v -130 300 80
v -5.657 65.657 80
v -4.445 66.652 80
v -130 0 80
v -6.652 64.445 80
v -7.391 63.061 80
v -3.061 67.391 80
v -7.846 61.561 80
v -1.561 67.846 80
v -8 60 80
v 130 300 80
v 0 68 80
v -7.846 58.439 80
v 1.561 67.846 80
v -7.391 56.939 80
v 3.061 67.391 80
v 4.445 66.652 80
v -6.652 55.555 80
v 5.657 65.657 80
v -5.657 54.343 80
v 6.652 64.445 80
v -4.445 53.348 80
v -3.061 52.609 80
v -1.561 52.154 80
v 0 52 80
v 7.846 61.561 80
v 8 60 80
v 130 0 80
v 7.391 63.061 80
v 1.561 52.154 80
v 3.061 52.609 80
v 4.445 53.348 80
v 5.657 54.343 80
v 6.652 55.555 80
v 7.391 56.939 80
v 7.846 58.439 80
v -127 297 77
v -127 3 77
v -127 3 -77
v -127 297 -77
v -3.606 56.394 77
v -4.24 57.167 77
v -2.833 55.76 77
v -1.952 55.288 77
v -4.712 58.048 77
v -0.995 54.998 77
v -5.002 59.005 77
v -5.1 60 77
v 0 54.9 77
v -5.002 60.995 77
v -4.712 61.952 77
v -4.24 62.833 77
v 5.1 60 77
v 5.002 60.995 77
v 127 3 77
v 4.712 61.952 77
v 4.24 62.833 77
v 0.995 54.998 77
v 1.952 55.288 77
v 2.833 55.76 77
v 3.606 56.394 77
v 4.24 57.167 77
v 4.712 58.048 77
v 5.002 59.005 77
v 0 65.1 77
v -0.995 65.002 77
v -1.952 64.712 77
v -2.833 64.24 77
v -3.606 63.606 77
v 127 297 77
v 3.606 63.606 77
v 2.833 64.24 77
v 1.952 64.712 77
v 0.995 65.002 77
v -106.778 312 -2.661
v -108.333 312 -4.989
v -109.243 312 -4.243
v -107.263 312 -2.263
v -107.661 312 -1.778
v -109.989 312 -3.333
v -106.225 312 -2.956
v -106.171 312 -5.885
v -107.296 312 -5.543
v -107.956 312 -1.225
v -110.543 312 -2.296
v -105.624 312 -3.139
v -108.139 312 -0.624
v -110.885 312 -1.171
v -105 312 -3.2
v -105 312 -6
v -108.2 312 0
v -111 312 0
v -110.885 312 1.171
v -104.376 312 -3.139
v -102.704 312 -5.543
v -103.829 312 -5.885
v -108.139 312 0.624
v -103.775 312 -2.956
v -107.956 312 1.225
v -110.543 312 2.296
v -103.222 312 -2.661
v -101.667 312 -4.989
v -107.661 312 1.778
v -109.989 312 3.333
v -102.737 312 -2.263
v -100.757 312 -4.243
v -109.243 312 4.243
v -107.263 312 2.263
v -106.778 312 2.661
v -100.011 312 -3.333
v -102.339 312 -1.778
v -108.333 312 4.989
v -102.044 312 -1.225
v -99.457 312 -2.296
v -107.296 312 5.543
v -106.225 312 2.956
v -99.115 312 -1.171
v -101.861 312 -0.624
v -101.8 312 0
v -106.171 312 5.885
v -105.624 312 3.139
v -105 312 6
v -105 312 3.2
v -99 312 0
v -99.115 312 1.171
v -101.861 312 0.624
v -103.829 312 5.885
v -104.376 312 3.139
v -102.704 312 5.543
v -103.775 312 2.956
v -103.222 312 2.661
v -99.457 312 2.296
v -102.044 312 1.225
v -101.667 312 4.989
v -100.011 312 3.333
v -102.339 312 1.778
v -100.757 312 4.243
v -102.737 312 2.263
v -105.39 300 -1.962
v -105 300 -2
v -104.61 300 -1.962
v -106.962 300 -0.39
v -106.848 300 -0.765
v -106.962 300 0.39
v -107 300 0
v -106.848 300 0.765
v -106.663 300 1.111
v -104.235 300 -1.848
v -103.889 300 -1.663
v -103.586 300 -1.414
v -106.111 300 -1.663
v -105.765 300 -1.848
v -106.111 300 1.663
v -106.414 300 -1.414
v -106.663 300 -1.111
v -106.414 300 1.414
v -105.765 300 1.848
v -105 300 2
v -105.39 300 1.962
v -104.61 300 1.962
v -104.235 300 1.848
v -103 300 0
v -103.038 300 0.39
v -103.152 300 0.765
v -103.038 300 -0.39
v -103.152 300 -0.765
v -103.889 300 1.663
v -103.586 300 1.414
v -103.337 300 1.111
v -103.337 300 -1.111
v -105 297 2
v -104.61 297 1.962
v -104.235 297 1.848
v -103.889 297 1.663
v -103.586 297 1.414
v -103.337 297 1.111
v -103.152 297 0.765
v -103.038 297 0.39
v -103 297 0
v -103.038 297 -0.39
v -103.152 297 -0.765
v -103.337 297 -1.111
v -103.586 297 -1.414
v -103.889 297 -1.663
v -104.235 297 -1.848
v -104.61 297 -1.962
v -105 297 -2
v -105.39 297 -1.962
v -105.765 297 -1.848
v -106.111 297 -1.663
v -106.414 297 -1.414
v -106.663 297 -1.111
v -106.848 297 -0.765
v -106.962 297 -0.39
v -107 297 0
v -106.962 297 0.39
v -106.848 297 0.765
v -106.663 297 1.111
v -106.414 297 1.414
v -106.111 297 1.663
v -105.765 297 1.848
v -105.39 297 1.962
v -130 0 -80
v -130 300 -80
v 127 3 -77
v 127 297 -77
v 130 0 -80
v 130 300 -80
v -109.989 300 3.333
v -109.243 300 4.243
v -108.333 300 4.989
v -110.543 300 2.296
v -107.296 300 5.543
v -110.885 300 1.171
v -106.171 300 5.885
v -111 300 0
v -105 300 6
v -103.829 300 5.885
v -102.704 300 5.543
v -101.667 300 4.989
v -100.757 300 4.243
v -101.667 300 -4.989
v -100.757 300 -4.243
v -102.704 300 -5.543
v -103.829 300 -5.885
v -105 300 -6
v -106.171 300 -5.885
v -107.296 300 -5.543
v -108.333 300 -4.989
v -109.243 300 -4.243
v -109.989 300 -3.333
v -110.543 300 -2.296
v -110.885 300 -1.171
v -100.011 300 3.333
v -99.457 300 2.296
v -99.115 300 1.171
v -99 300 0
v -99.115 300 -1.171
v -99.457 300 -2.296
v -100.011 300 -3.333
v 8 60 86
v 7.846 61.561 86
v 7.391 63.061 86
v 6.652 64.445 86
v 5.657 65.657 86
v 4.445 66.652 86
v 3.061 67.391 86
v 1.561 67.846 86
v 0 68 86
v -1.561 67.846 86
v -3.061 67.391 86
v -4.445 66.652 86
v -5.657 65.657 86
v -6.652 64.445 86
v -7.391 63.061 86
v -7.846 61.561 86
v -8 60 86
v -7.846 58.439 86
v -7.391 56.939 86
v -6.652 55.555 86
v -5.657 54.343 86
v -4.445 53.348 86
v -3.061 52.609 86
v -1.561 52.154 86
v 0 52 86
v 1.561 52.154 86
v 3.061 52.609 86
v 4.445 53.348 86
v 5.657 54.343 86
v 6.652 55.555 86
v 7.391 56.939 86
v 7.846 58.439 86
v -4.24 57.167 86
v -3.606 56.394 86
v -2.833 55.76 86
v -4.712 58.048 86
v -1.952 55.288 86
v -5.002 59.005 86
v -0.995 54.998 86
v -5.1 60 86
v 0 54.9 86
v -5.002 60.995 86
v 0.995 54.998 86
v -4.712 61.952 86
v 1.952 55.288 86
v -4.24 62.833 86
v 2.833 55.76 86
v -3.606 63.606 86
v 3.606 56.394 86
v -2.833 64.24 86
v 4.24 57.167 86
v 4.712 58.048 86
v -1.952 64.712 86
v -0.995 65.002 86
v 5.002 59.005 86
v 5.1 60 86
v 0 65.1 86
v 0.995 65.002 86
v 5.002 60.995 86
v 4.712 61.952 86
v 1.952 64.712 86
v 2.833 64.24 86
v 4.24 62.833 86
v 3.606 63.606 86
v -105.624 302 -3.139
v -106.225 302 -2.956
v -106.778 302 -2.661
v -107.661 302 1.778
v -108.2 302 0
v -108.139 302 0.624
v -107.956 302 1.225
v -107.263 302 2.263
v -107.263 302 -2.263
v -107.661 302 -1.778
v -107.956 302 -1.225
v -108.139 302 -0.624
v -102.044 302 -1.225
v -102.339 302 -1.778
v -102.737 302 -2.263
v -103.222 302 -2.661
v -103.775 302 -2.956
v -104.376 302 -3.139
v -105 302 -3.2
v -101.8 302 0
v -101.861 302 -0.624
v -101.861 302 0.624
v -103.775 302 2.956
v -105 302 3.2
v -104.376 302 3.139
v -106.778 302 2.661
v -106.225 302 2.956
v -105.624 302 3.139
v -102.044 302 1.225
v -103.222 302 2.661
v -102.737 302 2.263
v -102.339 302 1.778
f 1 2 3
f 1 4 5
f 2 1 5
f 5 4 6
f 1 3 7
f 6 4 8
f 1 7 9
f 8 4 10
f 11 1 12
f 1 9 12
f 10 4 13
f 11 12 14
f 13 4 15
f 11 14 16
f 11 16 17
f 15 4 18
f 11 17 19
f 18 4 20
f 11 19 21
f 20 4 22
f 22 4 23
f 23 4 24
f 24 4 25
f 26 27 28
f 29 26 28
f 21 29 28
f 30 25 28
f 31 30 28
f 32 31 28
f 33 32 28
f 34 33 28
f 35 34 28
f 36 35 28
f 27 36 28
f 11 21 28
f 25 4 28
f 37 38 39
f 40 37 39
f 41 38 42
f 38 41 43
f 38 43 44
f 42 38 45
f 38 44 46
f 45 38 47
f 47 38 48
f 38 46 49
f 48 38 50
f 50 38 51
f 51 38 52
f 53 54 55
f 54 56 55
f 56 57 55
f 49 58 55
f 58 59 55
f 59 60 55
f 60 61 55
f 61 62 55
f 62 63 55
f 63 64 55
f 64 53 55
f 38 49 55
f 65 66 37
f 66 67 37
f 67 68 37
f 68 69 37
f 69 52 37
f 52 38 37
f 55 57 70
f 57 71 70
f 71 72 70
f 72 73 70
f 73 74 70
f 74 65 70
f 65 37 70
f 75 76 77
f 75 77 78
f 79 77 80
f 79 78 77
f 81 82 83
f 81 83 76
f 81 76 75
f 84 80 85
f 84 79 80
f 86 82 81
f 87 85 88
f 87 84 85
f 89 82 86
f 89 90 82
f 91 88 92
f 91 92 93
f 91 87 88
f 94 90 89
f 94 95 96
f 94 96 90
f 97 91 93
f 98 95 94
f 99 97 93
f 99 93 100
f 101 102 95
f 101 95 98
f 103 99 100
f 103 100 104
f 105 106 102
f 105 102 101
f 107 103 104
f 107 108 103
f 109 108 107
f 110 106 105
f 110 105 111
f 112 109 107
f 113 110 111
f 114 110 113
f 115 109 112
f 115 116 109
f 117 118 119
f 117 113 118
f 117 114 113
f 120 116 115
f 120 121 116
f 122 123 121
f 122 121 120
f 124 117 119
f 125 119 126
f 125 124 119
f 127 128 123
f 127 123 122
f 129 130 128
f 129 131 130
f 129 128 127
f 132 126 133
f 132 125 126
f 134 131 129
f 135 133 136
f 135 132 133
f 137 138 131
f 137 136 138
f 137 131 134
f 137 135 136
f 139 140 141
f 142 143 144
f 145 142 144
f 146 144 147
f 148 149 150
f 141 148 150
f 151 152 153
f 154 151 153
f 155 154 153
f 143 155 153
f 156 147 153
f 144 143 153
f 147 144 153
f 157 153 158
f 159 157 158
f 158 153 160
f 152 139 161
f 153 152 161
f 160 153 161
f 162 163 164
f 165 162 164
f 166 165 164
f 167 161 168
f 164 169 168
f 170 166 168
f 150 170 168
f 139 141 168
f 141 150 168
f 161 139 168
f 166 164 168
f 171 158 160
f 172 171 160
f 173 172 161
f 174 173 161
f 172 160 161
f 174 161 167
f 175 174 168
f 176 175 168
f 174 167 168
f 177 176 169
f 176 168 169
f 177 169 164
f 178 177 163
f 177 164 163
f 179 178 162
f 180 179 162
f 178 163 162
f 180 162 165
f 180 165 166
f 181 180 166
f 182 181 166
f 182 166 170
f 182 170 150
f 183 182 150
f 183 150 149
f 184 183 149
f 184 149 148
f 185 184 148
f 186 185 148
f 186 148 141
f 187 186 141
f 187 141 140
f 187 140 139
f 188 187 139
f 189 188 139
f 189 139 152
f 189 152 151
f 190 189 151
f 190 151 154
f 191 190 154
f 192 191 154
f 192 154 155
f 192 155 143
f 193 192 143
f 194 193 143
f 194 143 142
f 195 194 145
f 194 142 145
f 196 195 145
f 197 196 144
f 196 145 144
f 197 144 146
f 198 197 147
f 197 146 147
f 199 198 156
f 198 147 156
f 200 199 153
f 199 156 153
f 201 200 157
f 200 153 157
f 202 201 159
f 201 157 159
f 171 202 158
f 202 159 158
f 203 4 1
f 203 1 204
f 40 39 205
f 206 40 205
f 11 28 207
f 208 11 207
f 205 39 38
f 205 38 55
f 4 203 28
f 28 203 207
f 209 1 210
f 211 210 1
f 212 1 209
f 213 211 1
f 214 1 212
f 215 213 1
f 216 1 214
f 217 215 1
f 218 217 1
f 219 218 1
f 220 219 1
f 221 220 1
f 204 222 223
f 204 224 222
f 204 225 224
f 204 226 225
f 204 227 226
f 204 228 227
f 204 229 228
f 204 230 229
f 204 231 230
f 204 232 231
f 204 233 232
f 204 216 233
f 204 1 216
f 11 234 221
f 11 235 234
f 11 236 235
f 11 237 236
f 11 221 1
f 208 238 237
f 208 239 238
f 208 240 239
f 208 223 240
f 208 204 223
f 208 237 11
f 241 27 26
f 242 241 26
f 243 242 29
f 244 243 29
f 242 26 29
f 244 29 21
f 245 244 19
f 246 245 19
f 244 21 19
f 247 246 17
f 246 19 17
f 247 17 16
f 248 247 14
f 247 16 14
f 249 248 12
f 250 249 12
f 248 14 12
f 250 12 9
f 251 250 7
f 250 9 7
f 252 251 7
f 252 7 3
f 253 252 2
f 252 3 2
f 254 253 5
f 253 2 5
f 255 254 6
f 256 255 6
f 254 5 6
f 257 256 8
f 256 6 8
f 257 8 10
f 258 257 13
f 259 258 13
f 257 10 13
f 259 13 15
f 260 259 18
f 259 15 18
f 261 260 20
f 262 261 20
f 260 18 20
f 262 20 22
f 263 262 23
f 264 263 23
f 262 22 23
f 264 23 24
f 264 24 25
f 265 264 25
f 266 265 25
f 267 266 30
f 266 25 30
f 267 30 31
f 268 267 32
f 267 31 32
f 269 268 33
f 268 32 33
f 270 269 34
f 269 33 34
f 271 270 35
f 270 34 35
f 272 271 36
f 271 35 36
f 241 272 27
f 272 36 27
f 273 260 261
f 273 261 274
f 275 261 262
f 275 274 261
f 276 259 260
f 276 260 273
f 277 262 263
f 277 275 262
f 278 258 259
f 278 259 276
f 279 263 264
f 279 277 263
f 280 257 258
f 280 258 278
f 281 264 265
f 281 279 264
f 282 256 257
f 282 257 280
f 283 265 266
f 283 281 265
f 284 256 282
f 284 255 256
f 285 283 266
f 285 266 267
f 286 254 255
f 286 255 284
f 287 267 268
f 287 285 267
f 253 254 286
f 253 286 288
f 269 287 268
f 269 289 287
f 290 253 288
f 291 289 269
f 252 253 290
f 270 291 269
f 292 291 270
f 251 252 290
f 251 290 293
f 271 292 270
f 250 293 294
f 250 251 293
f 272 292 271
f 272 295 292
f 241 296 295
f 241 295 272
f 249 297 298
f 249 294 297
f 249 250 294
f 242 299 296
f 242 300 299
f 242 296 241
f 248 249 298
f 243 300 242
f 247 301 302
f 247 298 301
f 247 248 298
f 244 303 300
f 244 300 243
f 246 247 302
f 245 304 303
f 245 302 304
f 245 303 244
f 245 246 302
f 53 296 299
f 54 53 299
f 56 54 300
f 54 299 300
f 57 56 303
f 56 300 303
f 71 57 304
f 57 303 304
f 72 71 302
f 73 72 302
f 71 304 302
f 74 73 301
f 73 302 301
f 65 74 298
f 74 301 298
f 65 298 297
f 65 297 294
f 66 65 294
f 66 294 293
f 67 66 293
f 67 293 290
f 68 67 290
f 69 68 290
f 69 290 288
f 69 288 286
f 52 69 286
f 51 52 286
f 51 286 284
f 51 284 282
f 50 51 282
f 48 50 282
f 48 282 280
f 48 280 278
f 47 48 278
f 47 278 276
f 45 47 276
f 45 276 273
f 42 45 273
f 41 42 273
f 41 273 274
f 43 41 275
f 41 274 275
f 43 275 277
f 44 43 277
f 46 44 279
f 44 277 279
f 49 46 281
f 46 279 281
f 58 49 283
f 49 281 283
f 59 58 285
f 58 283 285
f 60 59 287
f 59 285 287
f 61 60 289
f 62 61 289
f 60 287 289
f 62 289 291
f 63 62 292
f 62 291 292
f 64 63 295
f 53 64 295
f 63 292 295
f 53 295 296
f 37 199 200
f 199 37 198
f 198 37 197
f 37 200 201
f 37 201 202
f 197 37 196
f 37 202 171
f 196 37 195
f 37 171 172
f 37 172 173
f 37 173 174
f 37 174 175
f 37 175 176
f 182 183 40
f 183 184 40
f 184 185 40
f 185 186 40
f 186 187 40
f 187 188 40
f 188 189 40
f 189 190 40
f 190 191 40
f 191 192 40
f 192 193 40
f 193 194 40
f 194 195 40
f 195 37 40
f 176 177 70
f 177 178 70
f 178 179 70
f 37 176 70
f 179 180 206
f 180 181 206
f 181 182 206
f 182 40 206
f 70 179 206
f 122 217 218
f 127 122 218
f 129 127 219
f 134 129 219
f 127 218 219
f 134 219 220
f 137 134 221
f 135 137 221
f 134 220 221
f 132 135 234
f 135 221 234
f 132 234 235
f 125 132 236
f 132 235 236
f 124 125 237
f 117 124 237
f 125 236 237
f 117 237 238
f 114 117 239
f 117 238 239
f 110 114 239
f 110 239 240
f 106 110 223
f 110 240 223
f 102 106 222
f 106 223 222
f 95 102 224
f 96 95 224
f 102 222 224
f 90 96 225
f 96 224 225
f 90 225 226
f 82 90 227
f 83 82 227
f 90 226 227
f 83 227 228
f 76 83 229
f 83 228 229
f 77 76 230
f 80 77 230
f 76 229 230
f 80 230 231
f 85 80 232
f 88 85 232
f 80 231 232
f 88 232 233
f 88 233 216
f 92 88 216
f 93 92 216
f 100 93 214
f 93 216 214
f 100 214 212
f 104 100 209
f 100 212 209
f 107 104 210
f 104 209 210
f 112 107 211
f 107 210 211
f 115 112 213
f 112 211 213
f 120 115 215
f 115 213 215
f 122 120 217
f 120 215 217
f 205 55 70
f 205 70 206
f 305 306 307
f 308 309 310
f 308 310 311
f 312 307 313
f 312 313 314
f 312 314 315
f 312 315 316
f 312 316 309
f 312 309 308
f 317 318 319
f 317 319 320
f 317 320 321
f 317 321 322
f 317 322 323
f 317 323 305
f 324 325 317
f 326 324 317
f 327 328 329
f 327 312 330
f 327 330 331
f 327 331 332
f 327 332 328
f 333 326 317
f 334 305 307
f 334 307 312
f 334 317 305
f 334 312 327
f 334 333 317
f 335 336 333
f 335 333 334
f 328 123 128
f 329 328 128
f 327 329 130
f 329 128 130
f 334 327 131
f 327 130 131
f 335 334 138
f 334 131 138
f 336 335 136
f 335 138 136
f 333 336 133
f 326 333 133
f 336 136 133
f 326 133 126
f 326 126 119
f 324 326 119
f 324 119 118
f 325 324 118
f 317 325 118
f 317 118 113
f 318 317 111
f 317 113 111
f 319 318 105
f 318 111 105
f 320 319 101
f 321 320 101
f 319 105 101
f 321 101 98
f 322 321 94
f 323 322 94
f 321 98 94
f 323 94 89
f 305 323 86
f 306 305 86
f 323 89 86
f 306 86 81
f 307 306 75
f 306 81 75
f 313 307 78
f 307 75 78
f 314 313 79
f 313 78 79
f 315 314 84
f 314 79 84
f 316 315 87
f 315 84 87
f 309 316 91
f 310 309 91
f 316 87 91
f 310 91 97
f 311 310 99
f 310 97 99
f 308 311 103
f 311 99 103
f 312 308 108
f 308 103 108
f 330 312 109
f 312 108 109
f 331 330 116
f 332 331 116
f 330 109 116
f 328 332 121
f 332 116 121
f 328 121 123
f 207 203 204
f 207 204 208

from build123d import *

# Parameters (mm, degrees)
SKETCH1_W          = 260
SKETCH1_H          = 160
TANK_BODY_DEPTH    = 300
INSIDE_START       = 297
SKETCH2_W          = 254
SKETCH2_H          = 154
INSIDE_DEPTH       = 294
INLET_PORT_START   = 300
SKETCH3_R          = 6
INLET_PORT_DEPTH   = 12
INLET_SOCKET_START = 312
SKETCH4_R          = 3.2
INLET_SOCKET_DEPTH = 10
INLET_HOLE_START   = 300
SKETCH5_R          = 2
INLET_HOLE_DEPTH   = 5
OUTLET_BOSS_START  = 80
SKETCH6_R          = 8
OUTLET_BOSS_DEPTH  = 6
TAP_SOCKET_START   = 86
SKETCH7_R          = 5.1
TAP_SOCKET_DEPTH   = 10


with BuildPart() as part:
    # Sketch1 → Tank_Body (new body)
    with BuildSketch(Plane(origin=(0, 0, 0), x_dir=(1, 0, 0), z_dir=(0, 1, 0))):
        Rectangle(SKETCH1_W, SKETCH1_H)
    extrude(amount=TANK_BODY_DEPTH)

    # Sketch2 → Inside (cut)
    with BuildSketch(Plane(origin=(0, 0, 0), x_dir=(1, 0, 0), z_dir=(0, 1, 0)).offset(INSIDE_START)):
        Rectangle(SKETCH2_W, SKETCH2_H)
    extrude(amount=-INSIDE_DEPTH, mode=Mode.SUBTRACT)

    # Sketch3 → Inlet_Port (add)
    with BuildSketch(Plane(origin=(0, 0, 0), x_dir=(1, 0, 0), z_dir=(0, 1, 0)).offset(INLET_PORT_START)):
        with Locations(Location((-105, 0, 0), (0, 0, 270))):
            Circle(SKETCH3_R)
    extrude(amount=INLET_PORT_DEPTH)

    # Sketch4 → Inlet_Socket (cut)
    with BuildSketch(Plane(origin=(0, 0, 0), x_dir=(1, 0, 0), z_dir=(0, 1, 0)).offset(INLET_SOCKET_START)):
        with Locations(Location((-105, 0, 0), (0, 0, 270))):
            Circle(SKETCH4_R)
    extrude(amount=-INLET_SOCKET_DEPTH, mode=Mode.SUBTRACT)

    # Sketch5 → Inlet_Hole (cut)
    with BuildSketch(Plane(origin=(0, 0, 0), x_dir=(1, 0, 0), z_dir=(0, 1, 0)).offset(INLET_HOLE_START)):
        with Locations(Location((-105, 0, 0), (0, 0, 270))):
            Circle(SKETCH5_R)
    extrude(amount=-INLET_HOLE_DEPTH, mode=Mode.SUBTRACT)

    # Sketch6 → Outlet_Boss (add)
    with BuildSketch(Plane.XY.offset(OUTLET_BOSS_START)):
        with Locations((0, 60)):
            Circle(SKETCH6_R)
    extrude(amount=OUTLET_BOSS_DEPTH)

    # Sketch7 → Tap_Socket (cut)
    with BuildSketch(Plane.XY.offset(TAP_SOCKET_START)):
        with Locations((0, 60)):
            Circle(SKETCH7_R)
    extrude(amount=-TAP_SOCKET_DEPTH, mode=Mode.SUBTRACT)


solid = part.part
